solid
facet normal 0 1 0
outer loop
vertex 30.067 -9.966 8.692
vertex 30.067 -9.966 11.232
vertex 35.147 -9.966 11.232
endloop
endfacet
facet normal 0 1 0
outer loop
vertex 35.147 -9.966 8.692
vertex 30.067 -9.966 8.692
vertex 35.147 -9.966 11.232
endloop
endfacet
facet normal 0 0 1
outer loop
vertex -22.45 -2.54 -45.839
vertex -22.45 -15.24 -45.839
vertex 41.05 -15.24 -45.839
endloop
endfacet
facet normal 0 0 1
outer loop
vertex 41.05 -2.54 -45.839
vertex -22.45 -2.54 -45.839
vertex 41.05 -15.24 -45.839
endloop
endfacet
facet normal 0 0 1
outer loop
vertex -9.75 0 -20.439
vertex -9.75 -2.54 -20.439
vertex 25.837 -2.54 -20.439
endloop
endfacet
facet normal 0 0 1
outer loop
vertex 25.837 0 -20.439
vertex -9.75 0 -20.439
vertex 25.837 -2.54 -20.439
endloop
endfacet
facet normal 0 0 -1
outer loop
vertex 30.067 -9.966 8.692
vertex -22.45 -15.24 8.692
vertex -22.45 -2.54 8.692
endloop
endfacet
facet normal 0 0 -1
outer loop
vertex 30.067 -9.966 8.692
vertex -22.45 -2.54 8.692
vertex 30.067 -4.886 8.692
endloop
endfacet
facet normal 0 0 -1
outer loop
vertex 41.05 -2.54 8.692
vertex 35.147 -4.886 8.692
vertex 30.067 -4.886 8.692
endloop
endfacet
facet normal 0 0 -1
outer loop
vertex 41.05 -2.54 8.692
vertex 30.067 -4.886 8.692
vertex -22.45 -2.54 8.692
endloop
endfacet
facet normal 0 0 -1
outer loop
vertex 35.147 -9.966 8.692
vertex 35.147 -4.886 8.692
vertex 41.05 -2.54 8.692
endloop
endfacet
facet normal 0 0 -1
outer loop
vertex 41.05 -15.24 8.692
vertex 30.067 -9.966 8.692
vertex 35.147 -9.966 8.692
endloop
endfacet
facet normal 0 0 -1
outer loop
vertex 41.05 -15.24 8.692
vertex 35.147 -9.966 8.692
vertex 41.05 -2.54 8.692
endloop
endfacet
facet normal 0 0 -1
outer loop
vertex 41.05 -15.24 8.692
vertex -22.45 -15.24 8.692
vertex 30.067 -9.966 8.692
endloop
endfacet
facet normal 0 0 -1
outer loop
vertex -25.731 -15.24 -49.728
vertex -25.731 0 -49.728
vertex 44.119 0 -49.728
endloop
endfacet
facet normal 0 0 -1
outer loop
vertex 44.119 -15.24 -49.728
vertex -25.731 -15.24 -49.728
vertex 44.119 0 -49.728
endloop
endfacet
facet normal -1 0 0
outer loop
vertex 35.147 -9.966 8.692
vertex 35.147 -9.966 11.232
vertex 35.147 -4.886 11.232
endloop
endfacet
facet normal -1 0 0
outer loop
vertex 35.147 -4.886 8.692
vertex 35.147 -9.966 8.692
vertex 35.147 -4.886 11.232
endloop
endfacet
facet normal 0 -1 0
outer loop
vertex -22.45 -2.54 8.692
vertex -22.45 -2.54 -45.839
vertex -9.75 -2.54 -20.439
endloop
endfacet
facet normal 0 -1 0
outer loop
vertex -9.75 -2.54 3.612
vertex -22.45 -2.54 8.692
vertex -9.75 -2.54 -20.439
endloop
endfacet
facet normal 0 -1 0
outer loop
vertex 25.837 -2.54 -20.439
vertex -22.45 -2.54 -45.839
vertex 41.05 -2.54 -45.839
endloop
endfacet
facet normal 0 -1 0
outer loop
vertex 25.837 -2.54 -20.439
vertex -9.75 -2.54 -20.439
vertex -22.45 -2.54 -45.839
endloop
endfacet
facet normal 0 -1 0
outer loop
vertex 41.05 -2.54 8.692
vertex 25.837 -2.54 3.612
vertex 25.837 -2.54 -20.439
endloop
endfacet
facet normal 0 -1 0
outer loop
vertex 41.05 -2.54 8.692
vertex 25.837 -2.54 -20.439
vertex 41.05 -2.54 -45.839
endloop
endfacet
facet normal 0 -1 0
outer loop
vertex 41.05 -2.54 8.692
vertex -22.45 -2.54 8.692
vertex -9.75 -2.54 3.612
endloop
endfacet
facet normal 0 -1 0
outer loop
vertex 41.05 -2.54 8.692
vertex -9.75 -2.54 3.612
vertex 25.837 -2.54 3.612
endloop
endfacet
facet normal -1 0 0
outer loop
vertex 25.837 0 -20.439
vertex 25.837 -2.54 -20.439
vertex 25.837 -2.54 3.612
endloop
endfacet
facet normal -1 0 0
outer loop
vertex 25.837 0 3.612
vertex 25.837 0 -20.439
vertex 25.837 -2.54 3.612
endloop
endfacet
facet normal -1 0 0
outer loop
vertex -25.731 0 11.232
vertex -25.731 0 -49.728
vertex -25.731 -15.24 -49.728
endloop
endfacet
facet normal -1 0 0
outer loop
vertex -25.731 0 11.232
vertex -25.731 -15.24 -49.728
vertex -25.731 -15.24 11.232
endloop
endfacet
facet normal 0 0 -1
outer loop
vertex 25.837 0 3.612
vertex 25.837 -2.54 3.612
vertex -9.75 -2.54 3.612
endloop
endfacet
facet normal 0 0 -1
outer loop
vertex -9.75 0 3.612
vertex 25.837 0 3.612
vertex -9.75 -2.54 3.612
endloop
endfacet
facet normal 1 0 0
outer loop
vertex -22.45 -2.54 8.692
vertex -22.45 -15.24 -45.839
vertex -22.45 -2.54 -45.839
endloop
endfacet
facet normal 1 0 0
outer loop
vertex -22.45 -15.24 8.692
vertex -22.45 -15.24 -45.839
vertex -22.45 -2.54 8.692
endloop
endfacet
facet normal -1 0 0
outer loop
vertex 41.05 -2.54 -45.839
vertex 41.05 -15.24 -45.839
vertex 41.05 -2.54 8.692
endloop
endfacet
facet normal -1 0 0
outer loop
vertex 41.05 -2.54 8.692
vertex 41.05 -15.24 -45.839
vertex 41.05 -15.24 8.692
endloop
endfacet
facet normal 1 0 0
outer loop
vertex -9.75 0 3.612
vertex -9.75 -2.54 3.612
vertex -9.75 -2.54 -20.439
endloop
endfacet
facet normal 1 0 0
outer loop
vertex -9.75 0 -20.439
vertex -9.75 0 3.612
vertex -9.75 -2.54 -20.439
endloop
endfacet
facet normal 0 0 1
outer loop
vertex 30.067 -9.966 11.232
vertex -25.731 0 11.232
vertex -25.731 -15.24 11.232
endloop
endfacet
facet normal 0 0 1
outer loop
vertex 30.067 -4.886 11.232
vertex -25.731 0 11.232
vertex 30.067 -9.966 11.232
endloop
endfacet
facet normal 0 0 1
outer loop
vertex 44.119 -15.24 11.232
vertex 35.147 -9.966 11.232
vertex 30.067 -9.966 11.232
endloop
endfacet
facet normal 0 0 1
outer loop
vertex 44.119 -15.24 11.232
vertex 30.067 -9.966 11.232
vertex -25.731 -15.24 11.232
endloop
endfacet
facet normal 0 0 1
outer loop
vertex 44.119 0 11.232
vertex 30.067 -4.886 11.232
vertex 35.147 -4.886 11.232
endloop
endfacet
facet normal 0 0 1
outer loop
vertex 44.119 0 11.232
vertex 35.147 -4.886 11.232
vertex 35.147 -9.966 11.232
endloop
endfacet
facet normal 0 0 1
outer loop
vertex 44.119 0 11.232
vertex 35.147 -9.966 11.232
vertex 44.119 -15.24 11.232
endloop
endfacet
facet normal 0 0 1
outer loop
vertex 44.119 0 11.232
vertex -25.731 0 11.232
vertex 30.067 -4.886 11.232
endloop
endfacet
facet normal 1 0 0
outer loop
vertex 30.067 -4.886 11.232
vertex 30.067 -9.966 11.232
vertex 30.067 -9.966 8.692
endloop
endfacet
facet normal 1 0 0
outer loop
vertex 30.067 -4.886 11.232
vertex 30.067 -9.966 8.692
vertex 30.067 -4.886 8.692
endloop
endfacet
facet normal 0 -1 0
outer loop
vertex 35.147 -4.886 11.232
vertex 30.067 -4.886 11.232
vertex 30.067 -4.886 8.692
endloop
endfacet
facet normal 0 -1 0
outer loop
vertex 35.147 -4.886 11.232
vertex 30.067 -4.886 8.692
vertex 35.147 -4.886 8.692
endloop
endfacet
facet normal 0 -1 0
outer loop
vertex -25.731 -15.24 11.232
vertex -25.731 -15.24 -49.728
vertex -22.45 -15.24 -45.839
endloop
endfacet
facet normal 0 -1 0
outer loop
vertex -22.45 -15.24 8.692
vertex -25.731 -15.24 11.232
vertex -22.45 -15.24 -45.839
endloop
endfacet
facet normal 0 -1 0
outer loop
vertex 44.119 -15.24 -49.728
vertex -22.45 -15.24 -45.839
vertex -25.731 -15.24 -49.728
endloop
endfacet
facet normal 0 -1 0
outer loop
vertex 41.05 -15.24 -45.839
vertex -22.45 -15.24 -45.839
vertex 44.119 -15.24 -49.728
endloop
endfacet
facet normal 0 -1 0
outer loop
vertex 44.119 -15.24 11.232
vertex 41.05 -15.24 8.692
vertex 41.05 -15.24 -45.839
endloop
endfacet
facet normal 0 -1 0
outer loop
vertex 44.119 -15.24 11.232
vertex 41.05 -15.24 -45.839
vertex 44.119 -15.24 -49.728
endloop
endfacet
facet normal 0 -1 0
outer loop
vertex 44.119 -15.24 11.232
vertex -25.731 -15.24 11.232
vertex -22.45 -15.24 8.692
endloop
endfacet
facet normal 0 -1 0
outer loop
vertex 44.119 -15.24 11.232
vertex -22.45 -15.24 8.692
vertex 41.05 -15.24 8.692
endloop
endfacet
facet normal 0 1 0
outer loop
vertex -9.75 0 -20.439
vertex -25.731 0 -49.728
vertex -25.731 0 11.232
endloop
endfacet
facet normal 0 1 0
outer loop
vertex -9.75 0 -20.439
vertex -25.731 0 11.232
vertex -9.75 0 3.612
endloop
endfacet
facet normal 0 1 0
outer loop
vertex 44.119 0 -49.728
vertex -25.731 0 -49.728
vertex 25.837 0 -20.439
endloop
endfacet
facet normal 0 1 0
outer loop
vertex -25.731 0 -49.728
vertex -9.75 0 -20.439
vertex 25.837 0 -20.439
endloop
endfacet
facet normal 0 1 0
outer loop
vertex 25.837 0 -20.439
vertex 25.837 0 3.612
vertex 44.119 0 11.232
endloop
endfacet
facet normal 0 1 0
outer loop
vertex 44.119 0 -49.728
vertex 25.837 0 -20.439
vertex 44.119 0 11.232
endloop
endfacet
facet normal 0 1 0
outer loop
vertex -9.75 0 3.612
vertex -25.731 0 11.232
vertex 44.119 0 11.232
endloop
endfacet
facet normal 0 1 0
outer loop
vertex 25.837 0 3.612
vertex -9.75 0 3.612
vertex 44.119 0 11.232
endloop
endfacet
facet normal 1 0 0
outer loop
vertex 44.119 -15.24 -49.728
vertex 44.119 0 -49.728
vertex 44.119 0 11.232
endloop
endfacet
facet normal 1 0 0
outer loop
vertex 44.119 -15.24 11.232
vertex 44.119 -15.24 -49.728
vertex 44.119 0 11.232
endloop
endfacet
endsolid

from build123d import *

# Parameters (mm, degrees)
F0_W     = 69.85
F0_H     = 60.96
F1_DEPTH = 15.24
F2_W     = 63.5
F2_H     = 54.530626
F3_DEPTH = 12.7
F4_W     = 5.08
F4_H     = 5.08
F5_DEPTH = 25.4
F7_DEPTH = 25.4


with BuildPart() as f1:
    # F0 (on Front) → F1 (new body)
    with BuildSketch(Plane.XZ):
        with Locations((9.194272, -19.248438)):
            Rectangle(F0_W, F0_H)
    extrude(amount=F1_DEPTH)

    # F2 (on face) → F3 (cut)
    with BuildSketch(Plane.XZ.offset(15.24)):
        with Locations((9.300105, -18.573751)):
            Rectangle(F2_W, F2_H)
    extrude(amount=-F3_DEPTH, mode=Mode.SUBTRACT)

    # F4 (on face) → F5 (cut)
    with BuildSketch(Plane.XY.offset(11.231562)):
        with Locations((32.606527, -7.426056)):
            Rectangle(F4_W, F4_H)
    extrude(amount=-F5_DEPTH, mode=Mode.SUBTRACT)

    # F6 (on face) → F7 (cut)
    with BuildSketch(Plane.XZ.offset(2.54)):
        Polygon((-9.749895, 3.611562), (-9.749895, -11.760729), (-9.749895, -20.439064), (25.836561, -20.439064), (25.836561, 3.611562), (9.300105, 3.611562), align=None)
    extrude(amount=-F7_DEPTH, mode=Mode.SUBTRACT)


solid = f1.part
